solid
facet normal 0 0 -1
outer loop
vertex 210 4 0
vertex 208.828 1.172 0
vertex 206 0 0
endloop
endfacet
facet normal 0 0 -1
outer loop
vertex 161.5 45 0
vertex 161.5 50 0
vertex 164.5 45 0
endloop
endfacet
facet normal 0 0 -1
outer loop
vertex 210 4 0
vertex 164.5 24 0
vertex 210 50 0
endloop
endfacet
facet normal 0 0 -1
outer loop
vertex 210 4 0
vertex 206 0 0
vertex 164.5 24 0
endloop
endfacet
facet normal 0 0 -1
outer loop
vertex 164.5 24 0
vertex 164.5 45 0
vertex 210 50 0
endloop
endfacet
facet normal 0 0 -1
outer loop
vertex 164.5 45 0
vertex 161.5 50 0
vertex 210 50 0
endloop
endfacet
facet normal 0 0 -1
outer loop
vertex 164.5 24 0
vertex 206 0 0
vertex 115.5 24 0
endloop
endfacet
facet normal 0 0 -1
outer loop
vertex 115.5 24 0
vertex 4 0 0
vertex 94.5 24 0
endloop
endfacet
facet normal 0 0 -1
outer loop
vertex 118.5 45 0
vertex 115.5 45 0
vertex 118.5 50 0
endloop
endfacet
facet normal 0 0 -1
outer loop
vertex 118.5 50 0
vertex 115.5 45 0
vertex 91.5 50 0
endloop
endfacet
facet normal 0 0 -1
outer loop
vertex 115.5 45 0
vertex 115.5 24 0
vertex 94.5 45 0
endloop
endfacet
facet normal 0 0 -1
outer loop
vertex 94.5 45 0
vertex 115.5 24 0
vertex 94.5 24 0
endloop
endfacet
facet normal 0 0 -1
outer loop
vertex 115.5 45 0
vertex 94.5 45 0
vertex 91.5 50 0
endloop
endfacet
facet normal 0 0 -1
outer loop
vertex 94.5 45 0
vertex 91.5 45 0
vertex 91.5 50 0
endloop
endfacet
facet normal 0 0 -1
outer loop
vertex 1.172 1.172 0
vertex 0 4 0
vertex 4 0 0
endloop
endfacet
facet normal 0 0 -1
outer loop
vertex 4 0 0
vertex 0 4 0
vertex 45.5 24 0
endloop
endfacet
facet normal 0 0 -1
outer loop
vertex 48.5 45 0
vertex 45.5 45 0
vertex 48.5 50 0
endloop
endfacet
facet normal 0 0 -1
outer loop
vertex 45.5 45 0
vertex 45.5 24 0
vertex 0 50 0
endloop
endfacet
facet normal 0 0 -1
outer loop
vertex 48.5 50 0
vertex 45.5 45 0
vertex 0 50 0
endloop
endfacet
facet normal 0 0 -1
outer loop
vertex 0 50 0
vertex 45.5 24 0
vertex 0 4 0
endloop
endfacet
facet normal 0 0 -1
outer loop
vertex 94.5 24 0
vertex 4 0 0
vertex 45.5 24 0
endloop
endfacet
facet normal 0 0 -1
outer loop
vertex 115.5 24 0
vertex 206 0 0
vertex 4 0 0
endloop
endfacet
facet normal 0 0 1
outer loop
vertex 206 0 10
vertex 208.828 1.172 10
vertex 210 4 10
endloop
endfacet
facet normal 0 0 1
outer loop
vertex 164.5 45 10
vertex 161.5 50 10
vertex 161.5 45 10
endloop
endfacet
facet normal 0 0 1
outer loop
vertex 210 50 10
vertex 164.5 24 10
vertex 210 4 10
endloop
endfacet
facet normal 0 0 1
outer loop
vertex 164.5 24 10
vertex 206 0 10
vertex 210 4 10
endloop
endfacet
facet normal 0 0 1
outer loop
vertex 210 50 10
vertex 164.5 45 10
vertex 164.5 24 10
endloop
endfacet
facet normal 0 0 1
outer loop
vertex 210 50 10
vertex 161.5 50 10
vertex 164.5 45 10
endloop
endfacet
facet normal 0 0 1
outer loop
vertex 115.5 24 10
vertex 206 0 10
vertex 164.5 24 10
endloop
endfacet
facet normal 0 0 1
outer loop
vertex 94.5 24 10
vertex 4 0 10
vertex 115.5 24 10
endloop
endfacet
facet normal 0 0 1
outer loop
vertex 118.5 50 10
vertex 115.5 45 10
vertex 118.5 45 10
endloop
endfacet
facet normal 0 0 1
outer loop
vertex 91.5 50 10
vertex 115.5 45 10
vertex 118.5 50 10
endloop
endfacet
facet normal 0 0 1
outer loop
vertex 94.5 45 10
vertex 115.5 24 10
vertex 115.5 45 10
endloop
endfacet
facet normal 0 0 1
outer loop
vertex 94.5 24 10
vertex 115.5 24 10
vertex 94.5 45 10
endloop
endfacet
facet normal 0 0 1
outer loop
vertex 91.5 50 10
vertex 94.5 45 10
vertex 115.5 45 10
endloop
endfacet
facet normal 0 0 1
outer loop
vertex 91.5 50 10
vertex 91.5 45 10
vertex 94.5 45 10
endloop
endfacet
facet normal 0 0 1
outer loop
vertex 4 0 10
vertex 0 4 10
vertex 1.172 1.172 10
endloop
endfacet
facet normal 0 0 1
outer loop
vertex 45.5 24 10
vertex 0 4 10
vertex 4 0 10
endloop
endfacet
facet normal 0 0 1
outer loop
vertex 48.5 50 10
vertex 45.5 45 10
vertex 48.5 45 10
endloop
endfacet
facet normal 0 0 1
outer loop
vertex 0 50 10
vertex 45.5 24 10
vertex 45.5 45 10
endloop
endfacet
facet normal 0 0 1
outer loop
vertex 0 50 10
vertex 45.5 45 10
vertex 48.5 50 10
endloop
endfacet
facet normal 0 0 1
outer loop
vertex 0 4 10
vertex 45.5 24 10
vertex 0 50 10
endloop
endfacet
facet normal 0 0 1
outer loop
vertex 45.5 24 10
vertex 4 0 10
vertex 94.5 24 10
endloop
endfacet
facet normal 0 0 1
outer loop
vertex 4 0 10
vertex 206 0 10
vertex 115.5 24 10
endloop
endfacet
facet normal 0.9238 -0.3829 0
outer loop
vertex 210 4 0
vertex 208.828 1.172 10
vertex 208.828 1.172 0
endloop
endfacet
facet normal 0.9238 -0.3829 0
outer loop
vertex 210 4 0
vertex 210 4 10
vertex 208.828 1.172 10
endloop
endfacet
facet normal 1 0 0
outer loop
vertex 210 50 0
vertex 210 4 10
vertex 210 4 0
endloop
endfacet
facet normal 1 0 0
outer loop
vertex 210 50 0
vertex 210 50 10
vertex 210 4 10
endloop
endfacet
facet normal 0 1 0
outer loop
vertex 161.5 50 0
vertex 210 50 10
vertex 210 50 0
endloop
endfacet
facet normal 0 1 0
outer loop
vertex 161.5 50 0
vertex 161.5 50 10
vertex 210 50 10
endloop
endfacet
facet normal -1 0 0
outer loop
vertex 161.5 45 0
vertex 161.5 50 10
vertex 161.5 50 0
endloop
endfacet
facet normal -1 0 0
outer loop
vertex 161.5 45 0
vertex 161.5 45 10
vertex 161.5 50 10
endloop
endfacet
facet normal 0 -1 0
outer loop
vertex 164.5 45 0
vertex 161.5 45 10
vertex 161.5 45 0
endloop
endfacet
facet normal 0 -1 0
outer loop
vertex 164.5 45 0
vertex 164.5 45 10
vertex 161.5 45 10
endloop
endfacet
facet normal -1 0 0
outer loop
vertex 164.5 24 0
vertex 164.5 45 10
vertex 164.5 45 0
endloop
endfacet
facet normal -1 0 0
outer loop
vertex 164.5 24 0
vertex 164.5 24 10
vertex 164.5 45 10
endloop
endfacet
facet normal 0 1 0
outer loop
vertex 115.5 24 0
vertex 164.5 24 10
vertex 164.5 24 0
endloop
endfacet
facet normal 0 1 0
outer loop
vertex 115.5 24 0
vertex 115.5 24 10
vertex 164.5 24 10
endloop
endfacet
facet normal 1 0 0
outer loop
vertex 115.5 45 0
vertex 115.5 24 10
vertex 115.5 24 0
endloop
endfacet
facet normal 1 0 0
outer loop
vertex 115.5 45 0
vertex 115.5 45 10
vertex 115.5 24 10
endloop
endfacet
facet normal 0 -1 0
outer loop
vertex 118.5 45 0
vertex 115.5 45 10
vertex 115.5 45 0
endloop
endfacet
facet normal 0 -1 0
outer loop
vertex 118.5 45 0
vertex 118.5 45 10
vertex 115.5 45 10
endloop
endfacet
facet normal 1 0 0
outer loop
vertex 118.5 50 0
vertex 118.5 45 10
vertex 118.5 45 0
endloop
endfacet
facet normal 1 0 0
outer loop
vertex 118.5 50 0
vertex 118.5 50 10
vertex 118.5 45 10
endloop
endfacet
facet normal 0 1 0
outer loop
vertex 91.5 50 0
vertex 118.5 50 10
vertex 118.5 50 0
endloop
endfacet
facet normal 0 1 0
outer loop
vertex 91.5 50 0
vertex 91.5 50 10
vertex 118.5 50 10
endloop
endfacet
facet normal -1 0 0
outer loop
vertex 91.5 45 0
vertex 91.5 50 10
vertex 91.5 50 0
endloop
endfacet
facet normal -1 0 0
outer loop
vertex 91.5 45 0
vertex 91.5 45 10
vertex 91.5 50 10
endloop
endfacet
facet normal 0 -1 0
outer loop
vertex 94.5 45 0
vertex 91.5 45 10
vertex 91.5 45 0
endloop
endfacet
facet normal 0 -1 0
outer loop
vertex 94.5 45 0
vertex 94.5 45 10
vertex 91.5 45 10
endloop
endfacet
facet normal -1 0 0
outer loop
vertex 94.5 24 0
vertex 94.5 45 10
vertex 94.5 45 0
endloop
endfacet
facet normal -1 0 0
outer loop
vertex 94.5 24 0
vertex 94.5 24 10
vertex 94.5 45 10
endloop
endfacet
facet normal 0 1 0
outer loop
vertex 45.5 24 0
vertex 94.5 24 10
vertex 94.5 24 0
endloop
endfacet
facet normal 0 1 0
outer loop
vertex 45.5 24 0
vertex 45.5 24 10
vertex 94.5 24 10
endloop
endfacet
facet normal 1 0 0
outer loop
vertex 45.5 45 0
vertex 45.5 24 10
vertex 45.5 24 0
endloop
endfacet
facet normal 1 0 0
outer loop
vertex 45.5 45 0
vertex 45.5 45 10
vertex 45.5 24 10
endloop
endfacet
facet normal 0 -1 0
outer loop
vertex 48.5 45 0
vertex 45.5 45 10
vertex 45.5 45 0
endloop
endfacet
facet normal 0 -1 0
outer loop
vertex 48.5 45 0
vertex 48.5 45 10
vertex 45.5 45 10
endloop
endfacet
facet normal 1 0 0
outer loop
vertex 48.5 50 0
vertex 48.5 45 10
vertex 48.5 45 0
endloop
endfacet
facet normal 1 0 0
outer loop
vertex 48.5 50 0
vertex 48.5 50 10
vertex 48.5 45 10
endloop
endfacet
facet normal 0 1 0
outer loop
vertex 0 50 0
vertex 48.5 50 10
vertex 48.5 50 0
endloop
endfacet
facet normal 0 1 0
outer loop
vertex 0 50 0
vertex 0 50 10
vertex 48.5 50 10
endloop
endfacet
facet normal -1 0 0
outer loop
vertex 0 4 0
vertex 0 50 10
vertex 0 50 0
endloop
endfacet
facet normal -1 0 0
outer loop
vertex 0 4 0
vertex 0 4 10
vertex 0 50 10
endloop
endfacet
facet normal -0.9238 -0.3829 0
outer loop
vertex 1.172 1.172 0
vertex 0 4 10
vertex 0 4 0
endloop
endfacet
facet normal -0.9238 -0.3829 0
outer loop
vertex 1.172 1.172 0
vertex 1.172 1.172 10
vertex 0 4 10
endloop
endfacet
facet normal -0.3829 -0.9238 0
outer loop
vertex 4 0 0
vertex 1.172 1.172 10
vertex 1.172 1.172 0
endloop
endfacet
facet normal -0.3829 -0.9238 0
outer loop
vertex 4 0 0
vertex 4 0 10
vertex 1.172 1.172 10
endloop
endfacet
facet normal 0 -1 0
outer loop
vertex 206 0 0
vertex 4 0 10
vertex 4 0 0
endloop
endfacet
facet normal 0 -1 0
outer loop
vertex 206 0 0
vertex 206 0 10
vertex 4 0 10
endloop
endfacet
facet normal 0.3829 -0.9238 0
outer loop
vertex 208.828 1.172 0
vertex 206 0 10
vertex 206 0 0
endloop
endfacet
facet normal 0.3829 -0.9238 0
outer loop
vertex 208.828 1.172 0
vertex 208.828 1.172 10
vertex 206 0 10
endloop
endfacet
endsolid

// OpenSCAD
$fn = 32;

// ----------------------------------------------------------------------
// Oversize slot bar: 210 mm bar with 2 oversize windows
// ----------------------------------------------------------------------

// --- parameters (mm) ---
profile_height = 10;      // extrusion height
profile_points = 24;      // points of the closed outline

profile = [[0, 4], [1.172, 1.172], [4, 0], [206, 0], [208.828, 1.172], [210, 4], [210, 50], [161.5, 50], [161.5, 45], [164.5, 45], [164.5, 24], [115.5, 24], [115.5, 45], [118.5, 45], [118.5, 50], [91.5, 50], [91.5, 45], [94.5, 45], [94.5, 24], [45.5, 24], [45.5, 45], [48.5, 45], [48.5, 50], [0, 50]];  // single closed polygon, 24 points, counter clockwise

// --- the one profile operation ---
linear_extrude(height = profile_height) polygon(points = profile);
